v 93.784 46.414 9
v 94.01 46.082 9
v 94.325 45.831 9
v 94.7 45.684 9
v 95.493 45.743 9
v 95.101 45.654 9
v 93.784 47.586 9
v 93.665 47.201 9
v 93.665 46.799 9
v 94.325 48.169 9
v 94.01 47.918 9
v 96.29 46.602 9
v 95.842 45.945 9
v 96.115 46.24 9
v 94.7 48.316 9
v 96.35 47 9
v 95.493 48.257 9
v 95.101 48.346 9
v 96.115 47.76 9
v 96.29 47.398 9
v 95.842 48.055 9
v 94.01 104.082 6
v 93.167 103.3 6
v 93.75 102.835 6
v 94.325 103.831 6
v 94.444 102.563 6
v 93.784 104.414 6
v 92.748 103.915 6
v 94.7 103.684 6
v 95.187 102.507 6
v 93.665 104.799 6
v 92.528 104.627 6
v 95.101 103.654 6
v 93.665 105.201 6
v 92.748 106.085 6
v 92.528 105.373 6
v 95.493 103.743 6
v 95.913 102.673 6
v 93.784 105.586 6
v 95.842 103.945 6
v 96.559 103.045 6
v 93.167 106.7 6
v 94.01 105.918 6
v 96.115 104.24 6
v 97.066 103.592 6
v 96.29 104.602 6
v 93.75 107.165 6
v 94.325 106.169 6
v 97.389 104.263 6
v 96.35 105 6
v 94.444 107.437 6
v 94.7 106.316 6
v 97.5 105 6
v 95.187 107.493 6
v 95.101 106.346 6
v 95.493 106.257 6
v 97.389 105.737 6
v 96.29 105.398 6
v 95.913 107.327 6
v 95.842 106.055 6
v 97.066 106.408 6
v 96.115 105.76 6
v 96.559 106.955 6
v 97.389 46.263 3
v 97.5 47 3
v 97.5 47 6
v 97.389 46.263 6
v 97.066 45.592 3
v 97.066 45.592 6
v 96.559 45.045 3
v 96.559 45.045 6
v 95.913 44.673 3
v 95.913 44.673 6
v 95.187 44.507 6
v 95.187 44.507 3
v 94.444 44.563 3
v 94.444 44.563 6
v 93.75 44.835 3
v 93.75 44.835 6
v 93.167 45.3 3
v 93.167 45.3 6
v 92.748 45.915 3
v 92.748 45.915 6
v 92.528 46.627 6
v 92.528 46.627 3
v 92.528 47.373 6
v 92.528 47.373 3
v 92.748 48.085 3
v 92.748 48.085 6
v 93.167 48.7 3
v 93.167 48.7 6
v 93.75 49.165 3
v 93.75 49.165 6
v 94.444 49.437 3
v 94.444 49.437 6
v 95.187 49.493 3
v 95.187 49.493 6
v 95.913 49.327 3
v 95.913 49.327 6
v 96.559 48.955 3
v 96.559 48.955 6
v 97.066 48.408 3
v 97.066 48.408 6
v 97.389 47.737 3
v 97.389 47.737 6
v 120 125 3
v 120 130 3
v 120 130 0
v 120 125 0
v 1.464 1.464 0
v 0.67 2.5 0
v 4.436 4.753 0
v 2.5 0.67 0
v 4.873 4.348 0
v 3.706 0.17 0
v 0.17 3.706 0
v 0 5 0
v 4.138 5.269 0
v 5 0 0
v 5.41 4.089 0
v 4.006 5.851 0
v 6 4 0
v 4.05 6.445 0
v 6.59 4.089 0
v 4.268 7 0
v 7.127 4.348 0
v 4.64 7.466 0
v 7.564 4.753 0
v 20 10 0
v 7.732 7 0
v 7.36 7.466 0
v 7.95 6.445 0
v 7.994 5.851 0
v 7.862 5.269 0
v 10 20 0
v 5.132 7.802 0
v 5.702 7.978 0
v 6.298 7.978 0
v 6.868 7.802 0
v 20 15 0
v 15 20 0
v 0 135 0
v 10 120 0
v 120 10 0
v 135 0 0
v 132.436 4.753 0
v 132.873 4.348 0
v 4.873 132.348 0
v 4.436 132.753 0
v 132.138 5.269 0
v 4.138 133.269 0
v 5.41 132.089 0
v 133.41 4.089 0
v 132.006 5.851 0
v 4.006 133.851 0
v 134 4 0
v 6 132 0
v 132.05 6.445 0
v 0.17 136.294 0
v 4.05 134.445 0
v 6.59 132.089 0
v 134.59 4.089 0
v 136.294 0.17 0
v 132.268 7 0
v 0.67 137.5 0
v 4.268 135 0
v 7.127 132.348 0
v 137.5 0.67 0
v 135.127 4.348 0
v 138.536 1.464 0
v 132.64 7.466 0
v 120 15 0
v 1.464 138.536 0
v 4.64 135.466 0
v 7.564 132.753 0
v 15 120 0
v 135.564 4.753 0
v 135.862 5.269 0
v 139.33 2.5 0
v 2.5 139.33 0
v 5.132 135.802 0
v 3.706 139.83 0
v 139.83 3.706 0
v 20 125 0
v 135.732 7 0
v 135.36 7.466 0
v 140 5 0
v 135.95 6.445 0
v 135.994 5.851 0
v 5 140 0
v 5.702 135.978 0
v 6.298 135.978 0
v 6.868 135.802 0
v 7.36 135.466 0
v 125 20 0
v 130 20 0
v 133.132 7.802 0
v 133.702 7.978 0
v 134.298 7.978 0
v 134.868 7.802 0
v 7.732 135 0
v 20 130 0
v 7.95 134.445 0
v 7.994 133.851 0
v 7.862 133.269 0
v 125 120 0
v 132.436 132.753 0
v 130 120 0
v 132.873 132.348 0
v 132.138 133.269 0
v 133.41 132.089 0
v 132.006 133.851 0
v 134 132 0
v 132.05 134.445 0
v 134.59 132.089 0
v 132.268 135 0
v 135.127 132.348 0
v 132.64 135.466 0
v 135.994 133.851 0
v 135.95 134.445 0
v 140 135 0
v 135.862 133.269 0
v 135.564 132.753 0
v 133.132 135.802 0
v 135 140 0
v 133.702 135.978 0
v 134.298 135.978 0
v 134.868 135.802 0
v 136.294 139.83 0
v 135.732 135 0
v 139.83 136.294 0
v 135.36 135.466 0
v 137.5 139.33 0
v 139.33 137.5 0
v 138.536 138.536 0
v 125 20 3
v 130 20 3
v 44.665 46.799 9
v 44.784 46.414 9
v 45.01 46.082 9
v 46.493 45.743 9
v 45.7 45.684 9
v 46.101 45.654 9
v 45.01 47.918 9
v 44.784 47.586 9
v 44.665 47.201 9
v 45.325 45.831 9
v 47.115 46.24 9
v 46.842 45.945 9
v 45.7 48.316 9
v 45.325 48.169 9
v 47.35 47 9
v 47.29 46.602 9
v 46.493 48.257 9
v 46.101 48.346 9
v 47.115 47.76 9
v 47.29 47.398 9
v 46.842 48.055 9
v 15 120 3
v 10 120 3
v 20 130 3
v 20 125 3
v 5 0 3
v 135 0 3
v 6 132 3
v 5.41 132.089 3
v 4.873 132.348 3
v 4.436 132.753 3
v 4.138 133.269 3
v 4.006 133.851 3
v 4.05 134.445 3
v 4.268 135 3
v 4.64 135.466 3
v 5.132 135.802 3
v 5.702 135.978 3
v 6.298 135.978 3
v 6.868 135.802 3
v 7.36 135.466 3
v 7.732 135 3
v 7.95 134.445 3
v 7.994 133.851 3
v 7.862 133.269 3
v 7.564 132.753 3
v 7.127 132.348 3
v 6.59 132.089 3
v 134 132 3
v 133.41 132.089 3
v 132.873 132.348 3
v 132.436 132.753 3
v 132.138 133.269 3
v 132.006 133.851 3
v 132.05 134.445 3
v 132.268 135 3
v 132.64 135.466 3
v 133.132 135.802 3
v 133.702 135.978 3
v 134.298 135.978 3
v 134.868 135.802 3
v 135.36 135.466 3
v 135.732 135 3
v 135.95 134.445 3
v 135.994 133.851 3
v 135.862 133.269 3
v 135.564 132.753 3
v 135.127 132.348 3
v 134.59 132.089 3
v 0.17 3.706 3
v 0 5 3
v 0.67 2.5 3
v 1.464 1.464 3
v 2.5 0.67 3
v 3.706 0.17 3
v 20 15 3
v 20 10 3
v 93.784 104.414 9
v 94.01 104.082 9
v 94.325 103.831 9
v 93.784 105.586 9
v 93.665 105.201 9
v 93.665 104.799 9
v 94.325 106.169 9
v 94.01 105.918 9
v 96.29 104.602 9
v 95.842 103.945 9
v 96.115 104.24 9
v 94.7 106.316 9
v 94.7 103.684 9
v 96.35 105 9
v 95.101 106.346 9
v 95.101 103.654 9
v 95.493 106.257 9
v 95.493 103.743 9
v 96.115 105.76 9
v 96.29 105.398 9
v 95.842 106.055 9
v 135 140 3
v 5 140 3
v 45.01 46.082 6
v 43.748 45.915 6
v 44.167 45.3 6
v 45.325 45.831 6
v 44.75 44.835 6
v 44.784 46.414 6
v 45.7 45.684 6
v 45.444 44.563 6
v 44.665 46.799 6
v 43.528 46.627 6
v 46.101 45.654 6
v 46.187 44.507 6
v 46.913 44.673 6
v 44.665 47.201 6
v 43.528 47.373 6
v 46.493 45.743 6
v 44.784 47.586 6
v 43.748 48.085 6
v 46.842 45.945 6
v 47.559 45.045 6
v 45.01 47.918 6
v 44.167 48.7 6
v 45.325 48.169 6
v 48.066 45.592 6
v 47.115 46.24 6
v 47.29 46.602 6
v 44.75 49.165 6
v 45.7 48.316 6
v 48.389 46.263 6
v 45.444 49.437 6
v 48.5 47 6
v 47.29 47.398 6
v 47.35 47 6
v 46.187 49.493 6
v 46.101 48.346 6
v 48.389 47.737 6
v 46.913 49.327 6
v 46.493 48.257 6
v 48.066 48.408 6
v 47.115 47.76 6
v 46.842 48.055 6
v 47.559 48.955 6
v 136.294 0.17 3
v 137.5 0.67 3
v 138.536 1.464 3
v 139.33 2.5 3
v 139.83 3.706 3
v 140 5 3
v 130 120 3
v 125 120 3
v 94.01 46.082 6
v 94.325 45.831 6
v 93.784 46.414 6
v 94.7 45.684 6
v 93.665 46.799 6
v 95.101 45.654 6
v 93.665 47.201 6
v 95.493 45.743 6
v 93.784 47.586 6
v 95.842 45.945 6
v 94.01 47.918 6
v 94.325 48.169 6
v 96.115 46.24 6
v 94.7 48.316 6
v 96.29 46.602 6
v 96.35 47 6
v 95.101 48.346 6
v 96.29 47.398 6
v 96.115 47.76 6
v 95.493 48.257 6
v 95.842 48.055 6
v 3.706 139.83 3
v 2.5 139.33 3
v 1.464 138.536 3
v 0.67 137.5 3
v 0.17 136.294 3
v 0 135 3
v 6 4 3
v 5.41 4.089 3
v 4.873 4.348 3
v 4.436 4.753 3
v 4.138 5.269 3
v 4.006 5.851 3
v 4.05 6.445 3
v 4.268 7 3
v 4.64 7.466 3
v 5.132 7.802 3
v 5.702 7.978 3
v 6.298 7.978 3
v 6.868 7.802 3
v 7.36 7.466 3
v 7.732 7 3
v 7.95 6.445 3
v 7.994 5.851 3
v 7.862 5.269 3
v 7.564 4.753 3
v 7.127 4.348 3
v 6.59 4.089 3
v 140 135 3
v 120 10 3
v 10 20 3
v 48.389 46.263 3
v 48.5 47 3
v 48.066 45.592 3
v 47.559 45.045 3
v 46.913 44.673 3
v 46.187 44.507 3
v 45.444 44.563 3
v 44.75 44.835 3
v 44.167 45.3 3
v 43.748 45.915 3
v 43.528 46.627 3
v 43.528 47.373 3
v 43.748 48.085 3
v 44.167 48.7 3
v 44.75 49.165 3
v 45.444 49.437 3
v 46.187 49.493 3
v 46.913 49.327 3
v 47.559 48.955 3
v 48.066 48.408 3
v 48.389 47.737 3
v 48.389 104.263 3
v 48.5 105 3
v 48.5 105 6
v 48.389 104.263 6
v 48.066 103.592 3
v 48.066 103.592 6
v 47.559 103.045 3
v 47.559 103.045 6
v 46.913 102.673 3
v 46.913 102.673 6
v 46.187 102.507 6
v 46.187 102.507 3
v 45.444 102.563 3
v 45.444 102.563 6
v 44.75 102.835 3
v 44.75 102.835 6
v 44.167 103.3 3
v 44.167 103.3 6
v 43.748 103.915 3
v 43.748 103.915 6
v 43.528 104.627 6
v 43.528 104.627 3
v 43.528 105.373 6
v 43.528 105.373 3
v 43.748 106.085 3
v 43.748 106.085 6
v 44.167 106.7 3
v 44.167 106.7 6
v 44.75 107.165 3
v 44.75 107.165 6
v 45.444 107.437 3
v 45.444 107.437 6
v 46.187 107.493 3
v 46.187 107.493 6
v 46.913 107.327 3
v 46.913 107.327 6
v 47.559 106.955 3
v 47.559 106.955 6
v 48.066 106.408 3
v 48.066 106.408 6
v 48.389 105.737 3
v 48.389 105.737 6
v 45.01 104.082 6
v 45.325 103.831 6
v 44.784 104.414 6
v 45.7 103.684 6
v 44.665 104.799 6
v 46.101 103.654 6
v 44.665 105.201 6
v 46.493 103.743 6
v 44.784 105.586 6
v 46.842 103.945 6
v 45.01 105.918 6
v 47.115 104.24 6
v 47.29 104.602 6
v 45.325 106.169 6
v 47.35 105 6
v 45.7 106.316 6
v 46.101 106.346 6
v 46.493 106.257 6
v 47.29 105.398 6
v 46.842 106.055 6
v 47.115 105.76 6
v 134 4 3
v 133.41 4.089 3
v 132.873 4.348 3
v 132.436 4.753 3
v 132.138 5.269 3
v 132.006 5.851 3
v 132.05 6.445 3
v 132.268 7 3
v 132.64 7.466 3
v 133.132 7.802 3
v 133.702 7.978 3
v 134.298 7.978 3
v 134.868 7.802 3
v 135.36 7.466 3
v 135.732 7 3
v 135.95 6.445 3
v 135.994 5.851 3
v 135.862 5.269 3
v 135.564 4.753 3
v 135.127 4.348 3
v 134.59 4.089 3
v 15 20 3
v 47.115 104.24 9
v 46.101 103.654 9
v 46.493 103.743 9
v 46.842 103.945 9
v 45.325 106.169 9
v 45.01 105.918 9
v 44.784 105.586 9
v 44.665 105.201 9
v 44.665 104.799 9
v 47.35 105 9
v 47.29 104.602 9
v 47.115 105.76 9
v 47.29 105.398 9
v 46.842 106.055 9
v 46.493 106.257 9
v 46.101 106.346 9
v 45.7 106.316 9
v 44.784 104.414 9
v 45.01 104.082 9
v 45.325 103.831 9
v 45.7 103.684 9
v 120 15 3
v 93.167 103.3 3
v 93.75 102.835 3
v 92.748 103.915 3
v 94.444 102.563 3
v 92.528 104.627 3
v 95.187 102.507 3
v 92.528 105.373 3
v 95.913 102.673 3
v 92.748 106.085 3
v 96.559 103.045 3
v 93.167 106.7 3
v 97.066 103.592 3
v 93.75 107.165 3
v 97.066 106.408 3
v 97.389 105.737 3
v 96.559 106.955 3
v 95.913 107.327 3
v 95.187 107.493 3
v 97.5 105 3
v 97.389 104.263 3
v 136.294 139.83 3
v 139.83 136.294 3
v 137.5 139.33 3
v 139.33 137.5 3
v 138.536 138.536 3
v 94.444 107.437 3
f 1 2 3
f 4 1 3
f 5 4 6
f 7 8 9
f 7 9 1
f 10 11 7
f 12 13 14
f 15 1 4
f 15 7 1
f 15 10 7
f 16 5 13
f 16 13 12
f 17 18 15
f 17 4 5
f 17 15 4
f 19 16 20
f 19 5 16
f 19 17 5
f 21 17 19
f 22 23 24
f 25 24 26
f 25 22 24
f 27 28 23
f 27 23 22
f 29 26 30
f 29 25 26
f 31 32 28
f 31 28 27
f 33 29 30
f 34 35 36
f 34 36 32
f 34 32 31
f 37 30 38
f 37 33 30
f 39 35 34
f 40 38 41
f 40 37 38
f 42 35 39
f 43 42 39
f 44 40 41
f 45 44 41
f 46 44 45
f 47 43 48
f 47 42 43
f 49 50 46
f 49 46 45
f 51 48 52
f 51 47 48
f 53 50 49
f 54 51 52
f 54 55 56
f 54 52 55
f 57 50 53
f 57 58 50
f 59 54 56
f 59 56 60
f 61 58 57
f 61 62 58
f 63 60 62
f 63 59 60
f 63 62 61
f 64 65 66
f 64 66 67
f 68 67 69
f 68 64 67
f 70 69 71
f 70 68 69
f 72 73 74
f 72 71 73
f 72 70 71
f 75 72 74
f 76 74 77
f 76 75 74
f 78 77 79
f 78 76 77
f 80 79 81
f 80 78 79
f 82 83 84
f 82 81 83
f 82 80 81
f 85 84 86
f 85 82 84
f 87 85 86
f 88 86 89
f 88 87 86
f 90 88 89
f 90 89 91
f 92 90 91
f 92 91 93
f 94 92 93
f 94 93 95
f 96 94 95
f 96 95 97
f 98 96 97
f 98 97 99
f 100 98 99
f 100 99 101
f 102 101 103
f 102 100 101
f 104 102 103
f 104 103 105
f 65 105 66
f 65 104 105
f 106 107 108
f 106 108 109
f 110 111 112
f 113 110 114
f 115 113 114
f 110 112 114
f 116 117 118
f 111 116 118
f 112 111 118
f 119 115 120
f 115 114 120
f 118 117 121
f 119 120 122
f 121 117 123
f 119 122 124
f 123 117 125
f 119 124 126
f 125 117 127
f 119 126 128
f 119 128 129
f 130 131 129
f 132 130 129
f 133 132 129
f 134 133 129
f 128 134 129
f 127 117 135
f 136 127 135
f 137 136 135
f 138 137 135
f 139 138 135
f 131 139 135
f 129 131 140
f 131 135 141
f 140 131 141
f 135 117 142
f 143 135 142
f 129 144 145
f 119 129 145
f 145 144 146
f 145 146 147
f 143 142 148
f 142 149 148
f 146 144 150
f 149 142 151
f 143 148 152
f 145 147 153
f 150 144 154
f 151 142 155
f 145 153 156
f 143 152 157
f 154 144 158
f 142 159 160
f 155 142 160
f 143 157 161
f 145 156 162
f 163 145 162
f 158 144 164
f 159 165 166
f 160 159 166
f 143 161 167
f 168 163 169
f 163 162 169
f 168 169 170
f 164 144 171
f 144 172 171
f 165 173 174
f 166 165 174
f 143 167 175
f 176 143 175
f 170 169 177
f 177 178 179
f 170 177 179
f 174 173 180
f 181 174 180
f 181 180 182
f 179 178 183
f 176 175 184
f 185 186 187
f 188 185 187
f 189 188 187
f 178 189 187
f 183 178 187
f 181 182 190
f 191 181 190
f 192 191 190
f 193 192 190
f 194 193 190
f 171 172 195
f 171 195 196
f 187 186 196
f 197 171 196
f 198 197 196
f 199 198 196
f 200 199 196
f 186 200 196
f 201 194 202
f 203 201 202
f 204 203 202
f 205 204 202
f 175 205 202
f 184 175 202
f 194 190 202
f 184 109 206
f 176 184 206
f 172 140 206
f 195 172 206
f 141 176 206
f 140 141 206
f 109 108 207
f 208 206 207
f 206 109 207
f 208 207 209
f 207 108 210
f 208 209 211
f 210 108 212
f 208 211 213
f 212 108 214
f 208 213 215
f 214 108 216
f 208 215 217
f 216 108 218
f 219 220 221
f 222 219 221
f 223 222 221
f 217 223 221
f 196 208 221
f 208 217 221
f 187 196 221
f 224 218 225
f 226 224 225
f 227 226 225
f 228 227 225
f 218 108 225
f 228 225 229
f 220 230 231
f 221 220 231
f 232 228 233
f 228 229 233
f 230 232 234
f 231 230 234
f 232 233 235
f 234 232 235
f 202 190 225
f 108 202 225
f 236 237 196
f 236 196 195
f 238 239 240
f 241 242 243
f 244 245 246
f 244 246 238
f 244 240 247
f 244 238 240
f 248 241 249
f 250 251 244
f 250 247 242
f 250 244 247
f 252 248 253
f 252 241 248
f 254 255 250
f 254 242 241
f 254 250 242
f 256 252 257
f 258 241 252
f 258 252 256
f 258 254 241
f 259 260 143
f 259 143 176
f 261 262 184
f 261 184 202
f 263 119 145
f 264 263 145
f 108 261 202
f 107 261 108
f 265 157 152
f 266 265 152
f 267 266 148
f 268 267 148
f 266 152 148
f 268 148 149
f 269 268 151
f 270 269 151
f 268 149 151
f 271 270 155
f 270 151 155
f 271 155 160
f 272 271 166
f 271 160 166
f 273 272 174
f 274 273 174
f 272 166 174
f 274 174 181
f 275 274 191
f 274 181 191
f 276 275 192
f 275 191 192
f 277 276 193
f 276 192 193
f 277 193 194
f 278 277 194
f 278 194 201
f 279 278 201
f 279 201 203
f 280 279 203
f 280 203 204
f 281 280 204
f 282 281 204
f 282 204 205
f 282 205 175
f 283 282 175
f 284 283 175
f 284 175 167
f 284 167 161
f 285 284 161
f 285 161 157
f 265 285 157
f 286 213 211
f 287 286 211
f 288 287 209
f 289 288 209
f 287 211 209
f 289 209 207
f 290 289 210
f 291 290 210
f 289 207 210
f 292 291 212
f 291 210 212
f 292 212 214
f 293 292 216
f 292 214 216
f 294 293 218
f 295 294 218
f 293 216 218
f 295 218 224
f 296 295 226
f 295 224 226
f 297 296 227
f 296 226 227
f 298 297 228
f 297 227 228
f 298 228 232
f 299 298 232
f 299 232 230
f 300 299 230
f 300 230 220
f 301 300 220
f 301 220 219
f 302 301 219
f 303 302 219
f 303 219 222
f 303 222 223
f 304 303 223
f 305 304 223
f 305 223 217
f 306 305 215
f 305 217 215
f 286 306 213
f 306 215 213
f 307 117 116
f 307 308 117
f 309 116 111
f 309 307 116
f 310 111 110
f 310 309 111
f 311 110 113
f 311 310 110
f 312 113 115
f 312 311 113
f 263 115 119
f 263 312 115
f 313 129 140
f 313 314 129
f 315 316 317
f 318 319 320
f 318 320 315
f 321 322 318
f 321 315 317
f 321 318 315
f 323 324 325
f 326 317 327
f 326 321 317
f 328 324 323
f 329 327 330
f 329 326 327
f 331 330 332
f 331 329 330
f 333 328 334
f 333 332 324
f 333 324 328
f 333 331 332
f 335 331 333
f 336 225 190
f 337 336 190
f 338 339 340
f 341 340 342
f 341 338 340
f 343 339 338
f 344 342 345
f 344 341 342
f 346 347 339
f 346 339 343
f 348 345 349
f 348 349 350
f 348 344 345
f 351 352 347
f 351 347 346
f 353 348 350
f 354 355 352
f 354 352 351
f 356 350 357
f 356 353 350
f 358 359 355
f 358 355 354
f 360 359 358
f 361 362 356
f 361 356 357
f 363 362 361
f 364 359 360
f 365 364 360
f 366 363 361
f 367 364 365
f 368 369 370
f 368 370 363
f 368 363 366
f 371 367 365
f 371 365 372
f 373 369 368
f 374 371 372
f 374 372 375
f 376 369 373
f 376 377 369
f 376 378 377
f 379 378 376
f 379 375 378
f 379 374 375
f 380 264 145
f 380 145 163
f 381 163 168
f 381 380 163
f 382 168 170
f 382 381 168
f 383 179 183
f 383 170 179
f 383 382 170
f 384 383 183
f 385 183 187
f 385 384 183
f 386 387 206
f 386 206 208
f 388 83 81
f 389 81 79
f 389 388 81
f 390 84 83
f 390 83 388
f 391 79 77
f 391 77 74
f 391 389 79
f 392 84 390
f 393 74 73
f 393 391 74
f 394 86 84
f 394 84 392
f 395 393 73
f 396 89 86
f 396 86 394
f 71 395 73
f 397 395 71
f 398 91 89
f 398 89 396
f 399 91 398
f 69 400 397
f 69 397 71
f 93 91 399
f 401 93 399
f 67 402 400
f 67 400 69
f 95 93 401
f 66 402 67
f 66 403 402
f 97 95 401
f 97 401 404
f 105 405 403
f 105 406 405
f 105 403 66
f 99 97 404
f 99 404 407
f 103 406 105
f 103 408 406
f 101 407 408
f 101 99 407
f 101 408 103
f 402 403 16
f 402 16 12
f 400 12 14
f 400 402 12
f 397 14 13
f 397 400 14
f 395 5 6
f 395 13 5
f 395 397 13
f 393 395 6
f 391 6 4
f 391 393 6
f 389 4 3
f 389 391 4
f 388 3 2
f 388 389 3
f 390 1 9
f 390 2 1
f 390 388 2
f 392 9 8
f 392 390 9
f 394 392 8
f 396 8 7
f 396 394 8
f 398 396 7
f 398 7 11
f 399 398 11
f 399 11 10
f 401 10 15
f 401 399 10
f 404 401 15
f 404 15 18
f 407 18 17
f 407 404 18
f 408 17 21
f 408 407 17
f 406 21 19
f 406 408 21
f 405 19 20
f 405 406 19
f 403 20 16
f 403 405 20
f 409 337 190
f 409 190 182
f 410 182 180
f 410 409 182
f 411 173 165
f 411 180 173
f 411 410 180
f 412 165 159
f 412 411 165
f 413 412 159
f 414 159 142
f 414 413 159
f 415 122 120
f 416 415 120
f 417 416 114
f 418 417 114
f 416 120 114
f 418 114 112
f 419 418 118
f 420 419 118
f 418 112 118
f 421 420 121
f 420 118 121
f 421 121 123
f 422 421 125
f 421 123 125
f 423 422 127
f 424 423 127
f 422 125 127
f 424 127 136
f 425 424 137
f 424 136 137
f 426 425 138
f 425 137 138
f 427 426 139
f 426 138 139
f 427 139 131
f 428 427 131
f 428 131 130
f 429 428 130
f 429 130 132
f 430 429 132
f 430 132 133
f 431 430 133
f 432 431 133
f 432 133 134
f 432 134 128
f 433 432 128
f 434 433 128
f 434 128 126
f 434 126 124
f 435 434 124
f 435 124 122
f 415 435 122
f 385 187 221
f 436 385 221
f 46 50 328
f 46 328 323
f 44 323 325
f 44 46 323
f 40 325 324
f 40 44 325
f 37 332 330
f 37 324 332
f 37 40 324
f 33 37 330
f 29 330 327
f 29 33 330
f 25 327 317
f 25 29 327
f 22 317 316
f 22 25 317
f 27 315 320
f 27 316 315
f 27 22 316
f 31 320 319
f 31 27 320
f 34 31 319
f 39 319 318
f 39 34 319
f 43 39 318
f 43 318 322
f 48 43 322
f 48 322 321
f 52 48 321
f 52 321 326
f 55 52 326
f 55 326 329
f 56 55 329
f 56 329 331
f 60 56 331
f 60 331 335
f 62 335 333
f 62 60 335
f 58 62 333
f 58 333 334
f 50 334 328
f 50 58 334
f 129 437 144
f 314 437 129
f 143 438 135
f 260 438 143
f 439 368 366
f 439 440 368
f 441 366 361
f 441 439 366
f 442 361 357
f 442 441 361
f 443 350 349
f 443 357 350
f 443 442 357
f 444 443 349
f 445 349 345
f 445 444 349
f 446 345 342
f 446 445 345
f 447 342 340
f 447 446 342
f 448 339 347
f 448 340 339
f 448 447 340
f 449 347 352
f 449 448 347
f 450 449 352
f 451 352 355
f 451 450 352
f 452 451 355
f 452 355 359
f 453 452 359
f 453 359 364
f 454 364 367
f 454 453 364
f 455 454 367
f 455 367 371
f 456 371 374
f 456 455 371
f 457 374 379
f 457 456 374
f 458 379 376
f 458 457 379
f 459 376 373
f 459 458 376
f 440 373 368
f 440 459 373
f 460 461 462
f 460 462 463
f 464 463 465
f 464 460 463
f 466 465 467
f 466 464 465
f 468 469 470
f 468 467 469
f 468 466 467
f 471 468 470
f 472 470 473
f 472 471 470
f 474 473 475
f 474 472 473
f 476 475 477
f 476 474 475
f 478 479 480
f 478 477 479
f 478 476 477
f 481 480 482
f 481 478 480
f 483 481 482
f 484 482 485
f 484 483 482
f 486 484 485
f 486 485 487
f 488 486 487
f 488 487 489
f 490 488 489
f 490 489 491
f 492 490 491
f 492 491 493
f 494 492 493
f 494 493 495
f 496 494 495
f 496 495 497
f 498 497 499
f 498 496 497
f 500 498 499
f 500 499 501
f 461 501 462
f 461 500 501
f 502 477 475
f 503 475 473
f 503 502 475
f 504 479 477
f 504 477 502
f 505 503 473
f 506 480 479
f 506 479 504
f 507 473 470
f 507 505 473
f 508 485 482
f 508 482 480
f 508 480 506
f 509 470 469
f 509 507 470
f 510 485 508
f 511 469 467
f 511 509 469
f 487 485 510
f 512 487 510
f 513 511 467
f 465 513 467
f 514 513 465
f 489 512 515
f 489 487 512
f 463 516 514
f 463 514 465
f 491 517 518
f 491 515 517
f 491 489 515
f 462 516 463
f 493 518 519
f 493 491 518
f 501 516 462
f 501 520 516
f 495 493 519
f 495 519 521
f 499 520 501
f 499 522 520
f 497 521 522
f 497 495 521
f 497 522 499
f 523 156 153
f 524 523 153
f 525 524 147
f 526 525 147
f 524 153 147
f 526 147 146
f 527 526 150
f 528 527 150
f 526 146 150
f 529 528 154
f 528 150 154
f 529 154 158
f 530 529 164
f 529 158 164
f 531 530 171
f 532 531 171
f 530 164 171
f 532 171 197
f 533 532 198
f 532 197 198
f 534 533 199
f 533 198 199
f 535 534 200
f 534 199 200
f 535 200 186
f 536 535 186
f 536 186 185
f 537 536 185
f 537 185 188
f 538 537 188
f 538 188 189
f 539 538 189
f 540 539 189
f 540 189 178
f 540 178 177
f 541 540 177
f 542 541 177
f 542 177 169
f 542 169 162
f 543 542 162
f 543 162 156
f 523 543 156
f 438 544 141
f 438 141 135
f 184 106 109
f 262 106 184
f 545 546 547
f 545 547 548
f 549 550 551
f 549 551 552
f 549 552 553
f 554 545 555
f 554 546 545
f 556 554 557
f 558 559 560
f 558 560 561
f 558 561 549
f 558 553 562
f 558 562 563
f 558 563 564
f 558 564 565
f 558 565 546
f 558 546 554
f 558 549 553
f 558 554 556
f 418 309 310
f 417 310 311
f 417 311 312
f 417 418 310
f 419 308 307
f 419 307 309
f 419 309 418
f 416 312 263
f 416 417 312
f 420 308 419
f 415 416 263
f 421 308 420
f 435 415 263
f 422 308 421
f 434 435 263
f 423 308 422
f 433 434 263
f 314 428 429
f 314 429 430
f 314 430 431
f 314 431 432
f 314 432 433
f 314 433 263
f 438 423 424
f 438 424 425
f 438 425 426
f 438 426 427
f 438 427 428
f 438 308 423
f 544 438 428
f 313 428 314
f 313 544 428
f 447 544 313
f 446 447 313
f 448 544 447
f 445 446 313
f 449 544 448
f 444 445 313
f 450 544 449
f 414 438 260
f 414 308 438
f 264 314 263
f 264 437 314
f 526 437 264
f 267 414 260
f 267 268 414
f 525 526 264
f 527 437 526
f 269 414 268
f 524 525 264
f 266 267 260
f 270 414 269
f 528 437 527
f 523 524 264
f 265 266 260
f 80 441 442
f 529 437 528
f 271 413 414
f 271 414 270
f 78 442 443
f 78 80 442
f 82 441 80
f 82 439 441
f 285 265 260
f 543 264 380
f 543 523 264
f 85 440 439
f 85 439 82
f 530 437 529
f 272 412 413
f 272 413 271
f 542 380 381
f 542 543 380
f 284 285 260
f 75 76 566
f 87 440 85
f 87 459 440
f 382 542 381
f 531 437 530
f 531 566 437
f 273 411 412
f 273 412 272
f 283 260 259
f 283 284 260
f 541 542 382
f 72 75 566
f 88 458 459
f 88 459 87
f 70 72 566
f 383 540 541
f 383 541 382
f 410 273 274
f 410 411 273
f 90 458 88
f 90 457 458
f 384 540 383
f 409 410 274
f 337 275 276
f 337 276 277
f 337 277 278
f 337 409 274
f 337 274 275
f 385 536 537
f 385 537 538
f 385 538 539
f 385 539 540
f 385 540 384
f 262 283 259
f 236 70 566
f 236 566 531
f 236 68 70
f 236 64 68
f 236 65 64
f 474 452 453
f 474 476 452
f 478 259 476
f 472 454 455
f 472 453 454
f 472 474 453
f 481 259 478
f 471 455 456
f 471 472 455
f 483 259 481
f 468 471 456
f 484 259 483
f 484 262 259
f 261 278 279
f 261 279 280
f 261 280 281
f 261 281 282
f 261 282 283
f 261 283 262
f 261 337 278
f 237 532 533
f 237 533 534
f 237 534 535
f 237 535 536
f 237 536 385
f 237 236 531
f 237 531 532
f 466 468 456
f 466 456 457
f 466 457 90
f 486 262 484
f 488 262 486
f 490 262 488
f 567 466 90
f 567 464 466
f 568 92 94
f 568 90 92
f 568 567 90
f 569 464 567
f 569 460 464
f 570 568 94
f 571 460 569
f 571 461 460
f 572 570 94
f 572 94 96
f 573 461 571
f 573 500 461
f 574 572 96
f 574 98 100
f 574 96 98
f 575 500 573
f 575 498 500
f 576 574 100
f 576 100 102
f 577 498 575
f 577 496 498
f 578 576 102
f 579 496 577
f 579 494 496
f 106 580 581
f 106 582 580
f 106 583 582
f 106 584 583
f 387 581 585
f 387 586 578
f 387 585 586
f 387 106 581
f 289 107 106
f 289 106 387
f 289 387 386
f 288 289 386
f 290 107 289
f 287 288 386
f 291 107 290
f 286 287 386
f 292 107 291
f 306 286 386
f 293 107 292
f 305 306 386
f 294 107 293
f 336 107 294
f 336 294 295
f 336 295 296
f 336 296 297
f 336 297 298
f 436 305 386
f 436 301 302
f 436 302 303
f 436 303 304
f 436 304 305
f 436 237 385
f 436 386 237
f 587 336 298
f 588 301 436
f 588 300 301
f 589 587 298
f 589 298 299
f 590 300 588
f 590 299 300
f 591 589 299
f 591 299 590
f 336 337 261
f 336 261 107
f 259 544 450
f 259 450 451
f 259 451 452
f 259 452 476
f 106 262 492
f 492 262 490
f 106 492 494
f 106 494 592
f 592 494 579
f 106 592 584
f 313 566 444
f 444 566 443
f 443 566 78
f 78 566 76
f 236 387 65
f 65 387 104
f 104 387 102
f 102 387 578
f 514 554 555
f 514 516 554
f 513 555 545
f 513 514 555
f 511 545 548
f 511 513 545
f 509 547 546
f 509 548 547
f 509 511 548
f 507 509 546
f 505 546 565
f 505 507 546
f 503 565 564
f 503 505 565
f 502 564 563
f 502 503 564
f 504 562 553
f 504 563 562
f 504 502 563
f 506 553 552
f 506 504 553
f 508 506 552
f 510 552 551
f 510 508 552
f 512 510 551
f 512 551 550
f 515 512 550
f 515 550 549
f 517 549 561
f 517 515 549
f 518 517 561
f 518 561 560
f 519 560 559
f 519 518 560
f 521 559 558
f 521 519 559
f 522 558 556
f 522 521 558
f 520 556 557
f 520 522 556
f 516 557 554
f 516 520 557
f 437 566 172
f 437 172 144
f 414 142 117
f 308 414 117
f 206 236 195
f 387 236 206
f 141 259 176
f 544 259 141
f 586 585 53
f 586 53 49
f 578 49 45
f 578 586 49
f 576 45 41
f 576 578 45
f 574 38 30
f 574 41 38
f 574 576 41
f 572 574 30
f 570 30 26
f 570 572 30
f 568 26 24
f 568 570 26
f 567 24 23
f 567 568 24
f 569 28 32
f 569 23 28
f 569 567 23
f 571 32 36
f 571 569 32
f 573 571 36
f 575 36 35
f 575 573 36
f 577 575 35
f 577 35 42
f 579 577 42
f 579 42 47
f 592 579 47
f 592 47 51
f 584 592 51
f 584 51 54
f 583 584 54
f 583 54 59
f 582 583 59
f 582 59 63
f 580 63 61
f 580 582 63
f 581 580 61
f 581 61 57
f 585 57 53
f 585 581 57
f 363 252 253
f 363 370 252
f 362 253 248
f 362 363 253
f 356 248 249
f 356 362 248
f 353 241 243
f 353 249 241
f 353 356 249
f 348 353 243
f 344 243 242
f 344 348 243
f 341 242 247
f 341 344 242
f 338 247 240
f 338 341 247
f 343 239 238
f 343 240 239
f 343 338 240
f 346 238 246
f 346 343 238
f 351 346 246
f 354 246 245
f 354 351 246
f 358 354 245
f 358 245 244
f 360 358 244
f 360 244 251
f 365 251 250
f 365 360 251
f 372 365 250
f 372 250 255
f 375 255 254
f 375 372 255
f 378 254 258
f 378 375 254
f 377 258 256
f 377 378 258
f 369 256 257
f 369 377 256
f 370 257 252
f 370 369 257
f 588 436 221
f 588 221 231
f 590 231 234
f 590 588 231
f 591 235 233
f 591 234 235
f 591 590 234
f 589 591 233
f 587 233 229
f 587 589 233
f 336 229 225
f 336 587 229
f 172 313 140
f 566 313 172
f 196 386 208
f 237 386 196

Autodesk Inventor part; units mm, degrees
ref_plane "YZ Plane" through (0, 0, 0) normal (1, 0, 0) x (0, 1, 0)
ref_plane "XZ Plane" through (0, 0, 0) normal (0, 1, 0) x (-1, 0, 0)
ref_plane "XY Plane" through (0, 0, 0) normal (0, 0, 1) x (1, 0, 0)
sketch "Sketch1" plane through (0, 0, 0) normal (0, 0, 1) x (1, 0, 0)
  line L0 (0, 0) -> (140, 0)
  line L1 (140, 0) -> (140, 140)
  line L2 (140, 140) -> (0, 140)
  line L3 (0, 140) -> (0, 0)
  dimension "d0" = 140
  dimension "d1" = 140
extrude "Extrusion1" add sketch "Sketch1" along normal blind 3
fillet "Fillet1" radius 5 4 edges at (140, 140, 1.5) (140, 0, 1.5) (0, 140, 1.5) (0, 0, 1.5)
sketch "Sketch4" plane through (0, 0, 3) normal (0, 0, 1) x (1, 0, 0)
  line L0 (135, 140) -> (5, 140) projected
  line L1 (0, 135) -> (0, 5) projected
  line L2 (140, 5) -> (140, 135) projected
  line L3 (5, 0) -> (135, 0) projected
  point P0 (0, 0)
  point P1 (6, 134)
  point P2 (134, 134)
  point P3 (6, 6)
  point P4 (134, 6)
  dimension "d30" = 6
  dimension "d31" = 6
  dimension "d32" = 6
  dimension "d33" = 6
  dimension "d34" = 6
  dimension "d35" = 6
  dimension "d36" = 6
  dimension "d37" = 6
hole "Hole2" at (134, 134, 3) at (6, 6, 3) at (134, 6, 3) at (6, 134, 3) direction (0, 0, -1) diameter 4 depth 15
sketch "Sketch5" plane through (0, 0, 3) normal (0, 0, 1) x (1, 0, 0)
  line L0 (20, 130) -> (120, 130)
  line L1 (120, 130) -> (120, 125)
  line L2 (120, 125) -> (20, 125)
  line L3 (20, 125) -> (20, 130)
  line L4 (135, 140) -> (5, 140) projected
  line L5 (140, 5) -> (140, 135) projected
  line L6 (20, 15) -> (120, 15)
  line L7 (120, 15) -> (120, 10)
  line L8 (120, 10) -> (20, 10)
  line L9 (20, 10) -> (20, 15)
  line L10 (5, 0) -> (135, 0) projected
  line L11 (10, 120) -> (15, 120)
  line L12 (15, 120) -> (15, 20)
  line L13 (15, 20) -> (10, 20)
  line L14 (10, 20) -> (10, 120)
  line L15 (0, 135) -> (0, 5) projected
  line L16 (125, 120) -> (130, 120)
  line L17 (130, 120) -> (130, 20)
  line L18 (130, 20) -> (125, 20)
  line L19 (125, 20) -> (125, 120)
  point P0 (0, 0)
  dimension "d45" = 10
  dimension "d46" = 5
  dimension "d47" = 20
  dimension "d48" = 100
  dimension "d49" = 100
  dimension "d50" = 5
  dimension "d51" = 20
  dimension "d52" = 10
  dimension "d53" = 5
  dimension "d54" = 100
  dimension "d55" = 20
  dimension "d56" = 10
  dimension "d57" = 5
  dimension "d58" = 100
  dimension "d59" = 10
  dimension "d60" = 20
extrude "Extrusion4" cut sketch "Sketch5" against normal blind 10
sketch "Sketch6" plane through (0, 0, 3) normal (0, 0, 1) x (1, 0, 0)
  circle A0 centre (46, 105) radius 2.5
  circle A1 centre (95, 105) radius 2.5
  circle A2 centre (46, 47) radius 2.5
  circle A3 centre (95, 47) radius 2.5
  line L0 (140, 5) -> (140, 135) projected
  line L1 (135, 140) -> (5, 140) projected
  point P0 (0, 0)
  dimension "d66" = 5
  dimension "d67" = 5
  dimension "d68" = 5
  dimension "d69" = 5
  dimension "d70" = 58
  dimension "d71" = 58
  dimension "d72" = 49
  dimension "d73" = 0
  dimension "d74" = 45
  dimension "d76" = 49
  dimension "d77" = 35
  dimension "d79" = 0
extrude "Extrusion5" add sketch "Sketch6" along normal blind 3
sketch "Sketch7" plane through (46, 105, 6) normal (0, 0, 1) x (1, 0, 0)
  circle A0 centre (0, 0) radius 1.35
  circle A1 centre (49, 0) radius 2.5 projected
  circle A2 centre (49, 0) radius 1.35
  circle A3 centre (49, -58) radius 2.5 projected
  circle A4 centre (49, -58) radius 1.35
  circle A5 centre (0, -58) radius 1.35
  point P0 (-46, -105)
  point P1 (49, -55.5)
  dimension "d82" = 2.7
  dimension "d83" = 2.7
  dimension "d84" = 2.7
  dimension "d85" = 2.7
extrude "Extrusion6" add sketch "Sketch7" along normal blind 3 contours A0 | A2 | A4 | A5
properties part number "Led deksel niet hub"
